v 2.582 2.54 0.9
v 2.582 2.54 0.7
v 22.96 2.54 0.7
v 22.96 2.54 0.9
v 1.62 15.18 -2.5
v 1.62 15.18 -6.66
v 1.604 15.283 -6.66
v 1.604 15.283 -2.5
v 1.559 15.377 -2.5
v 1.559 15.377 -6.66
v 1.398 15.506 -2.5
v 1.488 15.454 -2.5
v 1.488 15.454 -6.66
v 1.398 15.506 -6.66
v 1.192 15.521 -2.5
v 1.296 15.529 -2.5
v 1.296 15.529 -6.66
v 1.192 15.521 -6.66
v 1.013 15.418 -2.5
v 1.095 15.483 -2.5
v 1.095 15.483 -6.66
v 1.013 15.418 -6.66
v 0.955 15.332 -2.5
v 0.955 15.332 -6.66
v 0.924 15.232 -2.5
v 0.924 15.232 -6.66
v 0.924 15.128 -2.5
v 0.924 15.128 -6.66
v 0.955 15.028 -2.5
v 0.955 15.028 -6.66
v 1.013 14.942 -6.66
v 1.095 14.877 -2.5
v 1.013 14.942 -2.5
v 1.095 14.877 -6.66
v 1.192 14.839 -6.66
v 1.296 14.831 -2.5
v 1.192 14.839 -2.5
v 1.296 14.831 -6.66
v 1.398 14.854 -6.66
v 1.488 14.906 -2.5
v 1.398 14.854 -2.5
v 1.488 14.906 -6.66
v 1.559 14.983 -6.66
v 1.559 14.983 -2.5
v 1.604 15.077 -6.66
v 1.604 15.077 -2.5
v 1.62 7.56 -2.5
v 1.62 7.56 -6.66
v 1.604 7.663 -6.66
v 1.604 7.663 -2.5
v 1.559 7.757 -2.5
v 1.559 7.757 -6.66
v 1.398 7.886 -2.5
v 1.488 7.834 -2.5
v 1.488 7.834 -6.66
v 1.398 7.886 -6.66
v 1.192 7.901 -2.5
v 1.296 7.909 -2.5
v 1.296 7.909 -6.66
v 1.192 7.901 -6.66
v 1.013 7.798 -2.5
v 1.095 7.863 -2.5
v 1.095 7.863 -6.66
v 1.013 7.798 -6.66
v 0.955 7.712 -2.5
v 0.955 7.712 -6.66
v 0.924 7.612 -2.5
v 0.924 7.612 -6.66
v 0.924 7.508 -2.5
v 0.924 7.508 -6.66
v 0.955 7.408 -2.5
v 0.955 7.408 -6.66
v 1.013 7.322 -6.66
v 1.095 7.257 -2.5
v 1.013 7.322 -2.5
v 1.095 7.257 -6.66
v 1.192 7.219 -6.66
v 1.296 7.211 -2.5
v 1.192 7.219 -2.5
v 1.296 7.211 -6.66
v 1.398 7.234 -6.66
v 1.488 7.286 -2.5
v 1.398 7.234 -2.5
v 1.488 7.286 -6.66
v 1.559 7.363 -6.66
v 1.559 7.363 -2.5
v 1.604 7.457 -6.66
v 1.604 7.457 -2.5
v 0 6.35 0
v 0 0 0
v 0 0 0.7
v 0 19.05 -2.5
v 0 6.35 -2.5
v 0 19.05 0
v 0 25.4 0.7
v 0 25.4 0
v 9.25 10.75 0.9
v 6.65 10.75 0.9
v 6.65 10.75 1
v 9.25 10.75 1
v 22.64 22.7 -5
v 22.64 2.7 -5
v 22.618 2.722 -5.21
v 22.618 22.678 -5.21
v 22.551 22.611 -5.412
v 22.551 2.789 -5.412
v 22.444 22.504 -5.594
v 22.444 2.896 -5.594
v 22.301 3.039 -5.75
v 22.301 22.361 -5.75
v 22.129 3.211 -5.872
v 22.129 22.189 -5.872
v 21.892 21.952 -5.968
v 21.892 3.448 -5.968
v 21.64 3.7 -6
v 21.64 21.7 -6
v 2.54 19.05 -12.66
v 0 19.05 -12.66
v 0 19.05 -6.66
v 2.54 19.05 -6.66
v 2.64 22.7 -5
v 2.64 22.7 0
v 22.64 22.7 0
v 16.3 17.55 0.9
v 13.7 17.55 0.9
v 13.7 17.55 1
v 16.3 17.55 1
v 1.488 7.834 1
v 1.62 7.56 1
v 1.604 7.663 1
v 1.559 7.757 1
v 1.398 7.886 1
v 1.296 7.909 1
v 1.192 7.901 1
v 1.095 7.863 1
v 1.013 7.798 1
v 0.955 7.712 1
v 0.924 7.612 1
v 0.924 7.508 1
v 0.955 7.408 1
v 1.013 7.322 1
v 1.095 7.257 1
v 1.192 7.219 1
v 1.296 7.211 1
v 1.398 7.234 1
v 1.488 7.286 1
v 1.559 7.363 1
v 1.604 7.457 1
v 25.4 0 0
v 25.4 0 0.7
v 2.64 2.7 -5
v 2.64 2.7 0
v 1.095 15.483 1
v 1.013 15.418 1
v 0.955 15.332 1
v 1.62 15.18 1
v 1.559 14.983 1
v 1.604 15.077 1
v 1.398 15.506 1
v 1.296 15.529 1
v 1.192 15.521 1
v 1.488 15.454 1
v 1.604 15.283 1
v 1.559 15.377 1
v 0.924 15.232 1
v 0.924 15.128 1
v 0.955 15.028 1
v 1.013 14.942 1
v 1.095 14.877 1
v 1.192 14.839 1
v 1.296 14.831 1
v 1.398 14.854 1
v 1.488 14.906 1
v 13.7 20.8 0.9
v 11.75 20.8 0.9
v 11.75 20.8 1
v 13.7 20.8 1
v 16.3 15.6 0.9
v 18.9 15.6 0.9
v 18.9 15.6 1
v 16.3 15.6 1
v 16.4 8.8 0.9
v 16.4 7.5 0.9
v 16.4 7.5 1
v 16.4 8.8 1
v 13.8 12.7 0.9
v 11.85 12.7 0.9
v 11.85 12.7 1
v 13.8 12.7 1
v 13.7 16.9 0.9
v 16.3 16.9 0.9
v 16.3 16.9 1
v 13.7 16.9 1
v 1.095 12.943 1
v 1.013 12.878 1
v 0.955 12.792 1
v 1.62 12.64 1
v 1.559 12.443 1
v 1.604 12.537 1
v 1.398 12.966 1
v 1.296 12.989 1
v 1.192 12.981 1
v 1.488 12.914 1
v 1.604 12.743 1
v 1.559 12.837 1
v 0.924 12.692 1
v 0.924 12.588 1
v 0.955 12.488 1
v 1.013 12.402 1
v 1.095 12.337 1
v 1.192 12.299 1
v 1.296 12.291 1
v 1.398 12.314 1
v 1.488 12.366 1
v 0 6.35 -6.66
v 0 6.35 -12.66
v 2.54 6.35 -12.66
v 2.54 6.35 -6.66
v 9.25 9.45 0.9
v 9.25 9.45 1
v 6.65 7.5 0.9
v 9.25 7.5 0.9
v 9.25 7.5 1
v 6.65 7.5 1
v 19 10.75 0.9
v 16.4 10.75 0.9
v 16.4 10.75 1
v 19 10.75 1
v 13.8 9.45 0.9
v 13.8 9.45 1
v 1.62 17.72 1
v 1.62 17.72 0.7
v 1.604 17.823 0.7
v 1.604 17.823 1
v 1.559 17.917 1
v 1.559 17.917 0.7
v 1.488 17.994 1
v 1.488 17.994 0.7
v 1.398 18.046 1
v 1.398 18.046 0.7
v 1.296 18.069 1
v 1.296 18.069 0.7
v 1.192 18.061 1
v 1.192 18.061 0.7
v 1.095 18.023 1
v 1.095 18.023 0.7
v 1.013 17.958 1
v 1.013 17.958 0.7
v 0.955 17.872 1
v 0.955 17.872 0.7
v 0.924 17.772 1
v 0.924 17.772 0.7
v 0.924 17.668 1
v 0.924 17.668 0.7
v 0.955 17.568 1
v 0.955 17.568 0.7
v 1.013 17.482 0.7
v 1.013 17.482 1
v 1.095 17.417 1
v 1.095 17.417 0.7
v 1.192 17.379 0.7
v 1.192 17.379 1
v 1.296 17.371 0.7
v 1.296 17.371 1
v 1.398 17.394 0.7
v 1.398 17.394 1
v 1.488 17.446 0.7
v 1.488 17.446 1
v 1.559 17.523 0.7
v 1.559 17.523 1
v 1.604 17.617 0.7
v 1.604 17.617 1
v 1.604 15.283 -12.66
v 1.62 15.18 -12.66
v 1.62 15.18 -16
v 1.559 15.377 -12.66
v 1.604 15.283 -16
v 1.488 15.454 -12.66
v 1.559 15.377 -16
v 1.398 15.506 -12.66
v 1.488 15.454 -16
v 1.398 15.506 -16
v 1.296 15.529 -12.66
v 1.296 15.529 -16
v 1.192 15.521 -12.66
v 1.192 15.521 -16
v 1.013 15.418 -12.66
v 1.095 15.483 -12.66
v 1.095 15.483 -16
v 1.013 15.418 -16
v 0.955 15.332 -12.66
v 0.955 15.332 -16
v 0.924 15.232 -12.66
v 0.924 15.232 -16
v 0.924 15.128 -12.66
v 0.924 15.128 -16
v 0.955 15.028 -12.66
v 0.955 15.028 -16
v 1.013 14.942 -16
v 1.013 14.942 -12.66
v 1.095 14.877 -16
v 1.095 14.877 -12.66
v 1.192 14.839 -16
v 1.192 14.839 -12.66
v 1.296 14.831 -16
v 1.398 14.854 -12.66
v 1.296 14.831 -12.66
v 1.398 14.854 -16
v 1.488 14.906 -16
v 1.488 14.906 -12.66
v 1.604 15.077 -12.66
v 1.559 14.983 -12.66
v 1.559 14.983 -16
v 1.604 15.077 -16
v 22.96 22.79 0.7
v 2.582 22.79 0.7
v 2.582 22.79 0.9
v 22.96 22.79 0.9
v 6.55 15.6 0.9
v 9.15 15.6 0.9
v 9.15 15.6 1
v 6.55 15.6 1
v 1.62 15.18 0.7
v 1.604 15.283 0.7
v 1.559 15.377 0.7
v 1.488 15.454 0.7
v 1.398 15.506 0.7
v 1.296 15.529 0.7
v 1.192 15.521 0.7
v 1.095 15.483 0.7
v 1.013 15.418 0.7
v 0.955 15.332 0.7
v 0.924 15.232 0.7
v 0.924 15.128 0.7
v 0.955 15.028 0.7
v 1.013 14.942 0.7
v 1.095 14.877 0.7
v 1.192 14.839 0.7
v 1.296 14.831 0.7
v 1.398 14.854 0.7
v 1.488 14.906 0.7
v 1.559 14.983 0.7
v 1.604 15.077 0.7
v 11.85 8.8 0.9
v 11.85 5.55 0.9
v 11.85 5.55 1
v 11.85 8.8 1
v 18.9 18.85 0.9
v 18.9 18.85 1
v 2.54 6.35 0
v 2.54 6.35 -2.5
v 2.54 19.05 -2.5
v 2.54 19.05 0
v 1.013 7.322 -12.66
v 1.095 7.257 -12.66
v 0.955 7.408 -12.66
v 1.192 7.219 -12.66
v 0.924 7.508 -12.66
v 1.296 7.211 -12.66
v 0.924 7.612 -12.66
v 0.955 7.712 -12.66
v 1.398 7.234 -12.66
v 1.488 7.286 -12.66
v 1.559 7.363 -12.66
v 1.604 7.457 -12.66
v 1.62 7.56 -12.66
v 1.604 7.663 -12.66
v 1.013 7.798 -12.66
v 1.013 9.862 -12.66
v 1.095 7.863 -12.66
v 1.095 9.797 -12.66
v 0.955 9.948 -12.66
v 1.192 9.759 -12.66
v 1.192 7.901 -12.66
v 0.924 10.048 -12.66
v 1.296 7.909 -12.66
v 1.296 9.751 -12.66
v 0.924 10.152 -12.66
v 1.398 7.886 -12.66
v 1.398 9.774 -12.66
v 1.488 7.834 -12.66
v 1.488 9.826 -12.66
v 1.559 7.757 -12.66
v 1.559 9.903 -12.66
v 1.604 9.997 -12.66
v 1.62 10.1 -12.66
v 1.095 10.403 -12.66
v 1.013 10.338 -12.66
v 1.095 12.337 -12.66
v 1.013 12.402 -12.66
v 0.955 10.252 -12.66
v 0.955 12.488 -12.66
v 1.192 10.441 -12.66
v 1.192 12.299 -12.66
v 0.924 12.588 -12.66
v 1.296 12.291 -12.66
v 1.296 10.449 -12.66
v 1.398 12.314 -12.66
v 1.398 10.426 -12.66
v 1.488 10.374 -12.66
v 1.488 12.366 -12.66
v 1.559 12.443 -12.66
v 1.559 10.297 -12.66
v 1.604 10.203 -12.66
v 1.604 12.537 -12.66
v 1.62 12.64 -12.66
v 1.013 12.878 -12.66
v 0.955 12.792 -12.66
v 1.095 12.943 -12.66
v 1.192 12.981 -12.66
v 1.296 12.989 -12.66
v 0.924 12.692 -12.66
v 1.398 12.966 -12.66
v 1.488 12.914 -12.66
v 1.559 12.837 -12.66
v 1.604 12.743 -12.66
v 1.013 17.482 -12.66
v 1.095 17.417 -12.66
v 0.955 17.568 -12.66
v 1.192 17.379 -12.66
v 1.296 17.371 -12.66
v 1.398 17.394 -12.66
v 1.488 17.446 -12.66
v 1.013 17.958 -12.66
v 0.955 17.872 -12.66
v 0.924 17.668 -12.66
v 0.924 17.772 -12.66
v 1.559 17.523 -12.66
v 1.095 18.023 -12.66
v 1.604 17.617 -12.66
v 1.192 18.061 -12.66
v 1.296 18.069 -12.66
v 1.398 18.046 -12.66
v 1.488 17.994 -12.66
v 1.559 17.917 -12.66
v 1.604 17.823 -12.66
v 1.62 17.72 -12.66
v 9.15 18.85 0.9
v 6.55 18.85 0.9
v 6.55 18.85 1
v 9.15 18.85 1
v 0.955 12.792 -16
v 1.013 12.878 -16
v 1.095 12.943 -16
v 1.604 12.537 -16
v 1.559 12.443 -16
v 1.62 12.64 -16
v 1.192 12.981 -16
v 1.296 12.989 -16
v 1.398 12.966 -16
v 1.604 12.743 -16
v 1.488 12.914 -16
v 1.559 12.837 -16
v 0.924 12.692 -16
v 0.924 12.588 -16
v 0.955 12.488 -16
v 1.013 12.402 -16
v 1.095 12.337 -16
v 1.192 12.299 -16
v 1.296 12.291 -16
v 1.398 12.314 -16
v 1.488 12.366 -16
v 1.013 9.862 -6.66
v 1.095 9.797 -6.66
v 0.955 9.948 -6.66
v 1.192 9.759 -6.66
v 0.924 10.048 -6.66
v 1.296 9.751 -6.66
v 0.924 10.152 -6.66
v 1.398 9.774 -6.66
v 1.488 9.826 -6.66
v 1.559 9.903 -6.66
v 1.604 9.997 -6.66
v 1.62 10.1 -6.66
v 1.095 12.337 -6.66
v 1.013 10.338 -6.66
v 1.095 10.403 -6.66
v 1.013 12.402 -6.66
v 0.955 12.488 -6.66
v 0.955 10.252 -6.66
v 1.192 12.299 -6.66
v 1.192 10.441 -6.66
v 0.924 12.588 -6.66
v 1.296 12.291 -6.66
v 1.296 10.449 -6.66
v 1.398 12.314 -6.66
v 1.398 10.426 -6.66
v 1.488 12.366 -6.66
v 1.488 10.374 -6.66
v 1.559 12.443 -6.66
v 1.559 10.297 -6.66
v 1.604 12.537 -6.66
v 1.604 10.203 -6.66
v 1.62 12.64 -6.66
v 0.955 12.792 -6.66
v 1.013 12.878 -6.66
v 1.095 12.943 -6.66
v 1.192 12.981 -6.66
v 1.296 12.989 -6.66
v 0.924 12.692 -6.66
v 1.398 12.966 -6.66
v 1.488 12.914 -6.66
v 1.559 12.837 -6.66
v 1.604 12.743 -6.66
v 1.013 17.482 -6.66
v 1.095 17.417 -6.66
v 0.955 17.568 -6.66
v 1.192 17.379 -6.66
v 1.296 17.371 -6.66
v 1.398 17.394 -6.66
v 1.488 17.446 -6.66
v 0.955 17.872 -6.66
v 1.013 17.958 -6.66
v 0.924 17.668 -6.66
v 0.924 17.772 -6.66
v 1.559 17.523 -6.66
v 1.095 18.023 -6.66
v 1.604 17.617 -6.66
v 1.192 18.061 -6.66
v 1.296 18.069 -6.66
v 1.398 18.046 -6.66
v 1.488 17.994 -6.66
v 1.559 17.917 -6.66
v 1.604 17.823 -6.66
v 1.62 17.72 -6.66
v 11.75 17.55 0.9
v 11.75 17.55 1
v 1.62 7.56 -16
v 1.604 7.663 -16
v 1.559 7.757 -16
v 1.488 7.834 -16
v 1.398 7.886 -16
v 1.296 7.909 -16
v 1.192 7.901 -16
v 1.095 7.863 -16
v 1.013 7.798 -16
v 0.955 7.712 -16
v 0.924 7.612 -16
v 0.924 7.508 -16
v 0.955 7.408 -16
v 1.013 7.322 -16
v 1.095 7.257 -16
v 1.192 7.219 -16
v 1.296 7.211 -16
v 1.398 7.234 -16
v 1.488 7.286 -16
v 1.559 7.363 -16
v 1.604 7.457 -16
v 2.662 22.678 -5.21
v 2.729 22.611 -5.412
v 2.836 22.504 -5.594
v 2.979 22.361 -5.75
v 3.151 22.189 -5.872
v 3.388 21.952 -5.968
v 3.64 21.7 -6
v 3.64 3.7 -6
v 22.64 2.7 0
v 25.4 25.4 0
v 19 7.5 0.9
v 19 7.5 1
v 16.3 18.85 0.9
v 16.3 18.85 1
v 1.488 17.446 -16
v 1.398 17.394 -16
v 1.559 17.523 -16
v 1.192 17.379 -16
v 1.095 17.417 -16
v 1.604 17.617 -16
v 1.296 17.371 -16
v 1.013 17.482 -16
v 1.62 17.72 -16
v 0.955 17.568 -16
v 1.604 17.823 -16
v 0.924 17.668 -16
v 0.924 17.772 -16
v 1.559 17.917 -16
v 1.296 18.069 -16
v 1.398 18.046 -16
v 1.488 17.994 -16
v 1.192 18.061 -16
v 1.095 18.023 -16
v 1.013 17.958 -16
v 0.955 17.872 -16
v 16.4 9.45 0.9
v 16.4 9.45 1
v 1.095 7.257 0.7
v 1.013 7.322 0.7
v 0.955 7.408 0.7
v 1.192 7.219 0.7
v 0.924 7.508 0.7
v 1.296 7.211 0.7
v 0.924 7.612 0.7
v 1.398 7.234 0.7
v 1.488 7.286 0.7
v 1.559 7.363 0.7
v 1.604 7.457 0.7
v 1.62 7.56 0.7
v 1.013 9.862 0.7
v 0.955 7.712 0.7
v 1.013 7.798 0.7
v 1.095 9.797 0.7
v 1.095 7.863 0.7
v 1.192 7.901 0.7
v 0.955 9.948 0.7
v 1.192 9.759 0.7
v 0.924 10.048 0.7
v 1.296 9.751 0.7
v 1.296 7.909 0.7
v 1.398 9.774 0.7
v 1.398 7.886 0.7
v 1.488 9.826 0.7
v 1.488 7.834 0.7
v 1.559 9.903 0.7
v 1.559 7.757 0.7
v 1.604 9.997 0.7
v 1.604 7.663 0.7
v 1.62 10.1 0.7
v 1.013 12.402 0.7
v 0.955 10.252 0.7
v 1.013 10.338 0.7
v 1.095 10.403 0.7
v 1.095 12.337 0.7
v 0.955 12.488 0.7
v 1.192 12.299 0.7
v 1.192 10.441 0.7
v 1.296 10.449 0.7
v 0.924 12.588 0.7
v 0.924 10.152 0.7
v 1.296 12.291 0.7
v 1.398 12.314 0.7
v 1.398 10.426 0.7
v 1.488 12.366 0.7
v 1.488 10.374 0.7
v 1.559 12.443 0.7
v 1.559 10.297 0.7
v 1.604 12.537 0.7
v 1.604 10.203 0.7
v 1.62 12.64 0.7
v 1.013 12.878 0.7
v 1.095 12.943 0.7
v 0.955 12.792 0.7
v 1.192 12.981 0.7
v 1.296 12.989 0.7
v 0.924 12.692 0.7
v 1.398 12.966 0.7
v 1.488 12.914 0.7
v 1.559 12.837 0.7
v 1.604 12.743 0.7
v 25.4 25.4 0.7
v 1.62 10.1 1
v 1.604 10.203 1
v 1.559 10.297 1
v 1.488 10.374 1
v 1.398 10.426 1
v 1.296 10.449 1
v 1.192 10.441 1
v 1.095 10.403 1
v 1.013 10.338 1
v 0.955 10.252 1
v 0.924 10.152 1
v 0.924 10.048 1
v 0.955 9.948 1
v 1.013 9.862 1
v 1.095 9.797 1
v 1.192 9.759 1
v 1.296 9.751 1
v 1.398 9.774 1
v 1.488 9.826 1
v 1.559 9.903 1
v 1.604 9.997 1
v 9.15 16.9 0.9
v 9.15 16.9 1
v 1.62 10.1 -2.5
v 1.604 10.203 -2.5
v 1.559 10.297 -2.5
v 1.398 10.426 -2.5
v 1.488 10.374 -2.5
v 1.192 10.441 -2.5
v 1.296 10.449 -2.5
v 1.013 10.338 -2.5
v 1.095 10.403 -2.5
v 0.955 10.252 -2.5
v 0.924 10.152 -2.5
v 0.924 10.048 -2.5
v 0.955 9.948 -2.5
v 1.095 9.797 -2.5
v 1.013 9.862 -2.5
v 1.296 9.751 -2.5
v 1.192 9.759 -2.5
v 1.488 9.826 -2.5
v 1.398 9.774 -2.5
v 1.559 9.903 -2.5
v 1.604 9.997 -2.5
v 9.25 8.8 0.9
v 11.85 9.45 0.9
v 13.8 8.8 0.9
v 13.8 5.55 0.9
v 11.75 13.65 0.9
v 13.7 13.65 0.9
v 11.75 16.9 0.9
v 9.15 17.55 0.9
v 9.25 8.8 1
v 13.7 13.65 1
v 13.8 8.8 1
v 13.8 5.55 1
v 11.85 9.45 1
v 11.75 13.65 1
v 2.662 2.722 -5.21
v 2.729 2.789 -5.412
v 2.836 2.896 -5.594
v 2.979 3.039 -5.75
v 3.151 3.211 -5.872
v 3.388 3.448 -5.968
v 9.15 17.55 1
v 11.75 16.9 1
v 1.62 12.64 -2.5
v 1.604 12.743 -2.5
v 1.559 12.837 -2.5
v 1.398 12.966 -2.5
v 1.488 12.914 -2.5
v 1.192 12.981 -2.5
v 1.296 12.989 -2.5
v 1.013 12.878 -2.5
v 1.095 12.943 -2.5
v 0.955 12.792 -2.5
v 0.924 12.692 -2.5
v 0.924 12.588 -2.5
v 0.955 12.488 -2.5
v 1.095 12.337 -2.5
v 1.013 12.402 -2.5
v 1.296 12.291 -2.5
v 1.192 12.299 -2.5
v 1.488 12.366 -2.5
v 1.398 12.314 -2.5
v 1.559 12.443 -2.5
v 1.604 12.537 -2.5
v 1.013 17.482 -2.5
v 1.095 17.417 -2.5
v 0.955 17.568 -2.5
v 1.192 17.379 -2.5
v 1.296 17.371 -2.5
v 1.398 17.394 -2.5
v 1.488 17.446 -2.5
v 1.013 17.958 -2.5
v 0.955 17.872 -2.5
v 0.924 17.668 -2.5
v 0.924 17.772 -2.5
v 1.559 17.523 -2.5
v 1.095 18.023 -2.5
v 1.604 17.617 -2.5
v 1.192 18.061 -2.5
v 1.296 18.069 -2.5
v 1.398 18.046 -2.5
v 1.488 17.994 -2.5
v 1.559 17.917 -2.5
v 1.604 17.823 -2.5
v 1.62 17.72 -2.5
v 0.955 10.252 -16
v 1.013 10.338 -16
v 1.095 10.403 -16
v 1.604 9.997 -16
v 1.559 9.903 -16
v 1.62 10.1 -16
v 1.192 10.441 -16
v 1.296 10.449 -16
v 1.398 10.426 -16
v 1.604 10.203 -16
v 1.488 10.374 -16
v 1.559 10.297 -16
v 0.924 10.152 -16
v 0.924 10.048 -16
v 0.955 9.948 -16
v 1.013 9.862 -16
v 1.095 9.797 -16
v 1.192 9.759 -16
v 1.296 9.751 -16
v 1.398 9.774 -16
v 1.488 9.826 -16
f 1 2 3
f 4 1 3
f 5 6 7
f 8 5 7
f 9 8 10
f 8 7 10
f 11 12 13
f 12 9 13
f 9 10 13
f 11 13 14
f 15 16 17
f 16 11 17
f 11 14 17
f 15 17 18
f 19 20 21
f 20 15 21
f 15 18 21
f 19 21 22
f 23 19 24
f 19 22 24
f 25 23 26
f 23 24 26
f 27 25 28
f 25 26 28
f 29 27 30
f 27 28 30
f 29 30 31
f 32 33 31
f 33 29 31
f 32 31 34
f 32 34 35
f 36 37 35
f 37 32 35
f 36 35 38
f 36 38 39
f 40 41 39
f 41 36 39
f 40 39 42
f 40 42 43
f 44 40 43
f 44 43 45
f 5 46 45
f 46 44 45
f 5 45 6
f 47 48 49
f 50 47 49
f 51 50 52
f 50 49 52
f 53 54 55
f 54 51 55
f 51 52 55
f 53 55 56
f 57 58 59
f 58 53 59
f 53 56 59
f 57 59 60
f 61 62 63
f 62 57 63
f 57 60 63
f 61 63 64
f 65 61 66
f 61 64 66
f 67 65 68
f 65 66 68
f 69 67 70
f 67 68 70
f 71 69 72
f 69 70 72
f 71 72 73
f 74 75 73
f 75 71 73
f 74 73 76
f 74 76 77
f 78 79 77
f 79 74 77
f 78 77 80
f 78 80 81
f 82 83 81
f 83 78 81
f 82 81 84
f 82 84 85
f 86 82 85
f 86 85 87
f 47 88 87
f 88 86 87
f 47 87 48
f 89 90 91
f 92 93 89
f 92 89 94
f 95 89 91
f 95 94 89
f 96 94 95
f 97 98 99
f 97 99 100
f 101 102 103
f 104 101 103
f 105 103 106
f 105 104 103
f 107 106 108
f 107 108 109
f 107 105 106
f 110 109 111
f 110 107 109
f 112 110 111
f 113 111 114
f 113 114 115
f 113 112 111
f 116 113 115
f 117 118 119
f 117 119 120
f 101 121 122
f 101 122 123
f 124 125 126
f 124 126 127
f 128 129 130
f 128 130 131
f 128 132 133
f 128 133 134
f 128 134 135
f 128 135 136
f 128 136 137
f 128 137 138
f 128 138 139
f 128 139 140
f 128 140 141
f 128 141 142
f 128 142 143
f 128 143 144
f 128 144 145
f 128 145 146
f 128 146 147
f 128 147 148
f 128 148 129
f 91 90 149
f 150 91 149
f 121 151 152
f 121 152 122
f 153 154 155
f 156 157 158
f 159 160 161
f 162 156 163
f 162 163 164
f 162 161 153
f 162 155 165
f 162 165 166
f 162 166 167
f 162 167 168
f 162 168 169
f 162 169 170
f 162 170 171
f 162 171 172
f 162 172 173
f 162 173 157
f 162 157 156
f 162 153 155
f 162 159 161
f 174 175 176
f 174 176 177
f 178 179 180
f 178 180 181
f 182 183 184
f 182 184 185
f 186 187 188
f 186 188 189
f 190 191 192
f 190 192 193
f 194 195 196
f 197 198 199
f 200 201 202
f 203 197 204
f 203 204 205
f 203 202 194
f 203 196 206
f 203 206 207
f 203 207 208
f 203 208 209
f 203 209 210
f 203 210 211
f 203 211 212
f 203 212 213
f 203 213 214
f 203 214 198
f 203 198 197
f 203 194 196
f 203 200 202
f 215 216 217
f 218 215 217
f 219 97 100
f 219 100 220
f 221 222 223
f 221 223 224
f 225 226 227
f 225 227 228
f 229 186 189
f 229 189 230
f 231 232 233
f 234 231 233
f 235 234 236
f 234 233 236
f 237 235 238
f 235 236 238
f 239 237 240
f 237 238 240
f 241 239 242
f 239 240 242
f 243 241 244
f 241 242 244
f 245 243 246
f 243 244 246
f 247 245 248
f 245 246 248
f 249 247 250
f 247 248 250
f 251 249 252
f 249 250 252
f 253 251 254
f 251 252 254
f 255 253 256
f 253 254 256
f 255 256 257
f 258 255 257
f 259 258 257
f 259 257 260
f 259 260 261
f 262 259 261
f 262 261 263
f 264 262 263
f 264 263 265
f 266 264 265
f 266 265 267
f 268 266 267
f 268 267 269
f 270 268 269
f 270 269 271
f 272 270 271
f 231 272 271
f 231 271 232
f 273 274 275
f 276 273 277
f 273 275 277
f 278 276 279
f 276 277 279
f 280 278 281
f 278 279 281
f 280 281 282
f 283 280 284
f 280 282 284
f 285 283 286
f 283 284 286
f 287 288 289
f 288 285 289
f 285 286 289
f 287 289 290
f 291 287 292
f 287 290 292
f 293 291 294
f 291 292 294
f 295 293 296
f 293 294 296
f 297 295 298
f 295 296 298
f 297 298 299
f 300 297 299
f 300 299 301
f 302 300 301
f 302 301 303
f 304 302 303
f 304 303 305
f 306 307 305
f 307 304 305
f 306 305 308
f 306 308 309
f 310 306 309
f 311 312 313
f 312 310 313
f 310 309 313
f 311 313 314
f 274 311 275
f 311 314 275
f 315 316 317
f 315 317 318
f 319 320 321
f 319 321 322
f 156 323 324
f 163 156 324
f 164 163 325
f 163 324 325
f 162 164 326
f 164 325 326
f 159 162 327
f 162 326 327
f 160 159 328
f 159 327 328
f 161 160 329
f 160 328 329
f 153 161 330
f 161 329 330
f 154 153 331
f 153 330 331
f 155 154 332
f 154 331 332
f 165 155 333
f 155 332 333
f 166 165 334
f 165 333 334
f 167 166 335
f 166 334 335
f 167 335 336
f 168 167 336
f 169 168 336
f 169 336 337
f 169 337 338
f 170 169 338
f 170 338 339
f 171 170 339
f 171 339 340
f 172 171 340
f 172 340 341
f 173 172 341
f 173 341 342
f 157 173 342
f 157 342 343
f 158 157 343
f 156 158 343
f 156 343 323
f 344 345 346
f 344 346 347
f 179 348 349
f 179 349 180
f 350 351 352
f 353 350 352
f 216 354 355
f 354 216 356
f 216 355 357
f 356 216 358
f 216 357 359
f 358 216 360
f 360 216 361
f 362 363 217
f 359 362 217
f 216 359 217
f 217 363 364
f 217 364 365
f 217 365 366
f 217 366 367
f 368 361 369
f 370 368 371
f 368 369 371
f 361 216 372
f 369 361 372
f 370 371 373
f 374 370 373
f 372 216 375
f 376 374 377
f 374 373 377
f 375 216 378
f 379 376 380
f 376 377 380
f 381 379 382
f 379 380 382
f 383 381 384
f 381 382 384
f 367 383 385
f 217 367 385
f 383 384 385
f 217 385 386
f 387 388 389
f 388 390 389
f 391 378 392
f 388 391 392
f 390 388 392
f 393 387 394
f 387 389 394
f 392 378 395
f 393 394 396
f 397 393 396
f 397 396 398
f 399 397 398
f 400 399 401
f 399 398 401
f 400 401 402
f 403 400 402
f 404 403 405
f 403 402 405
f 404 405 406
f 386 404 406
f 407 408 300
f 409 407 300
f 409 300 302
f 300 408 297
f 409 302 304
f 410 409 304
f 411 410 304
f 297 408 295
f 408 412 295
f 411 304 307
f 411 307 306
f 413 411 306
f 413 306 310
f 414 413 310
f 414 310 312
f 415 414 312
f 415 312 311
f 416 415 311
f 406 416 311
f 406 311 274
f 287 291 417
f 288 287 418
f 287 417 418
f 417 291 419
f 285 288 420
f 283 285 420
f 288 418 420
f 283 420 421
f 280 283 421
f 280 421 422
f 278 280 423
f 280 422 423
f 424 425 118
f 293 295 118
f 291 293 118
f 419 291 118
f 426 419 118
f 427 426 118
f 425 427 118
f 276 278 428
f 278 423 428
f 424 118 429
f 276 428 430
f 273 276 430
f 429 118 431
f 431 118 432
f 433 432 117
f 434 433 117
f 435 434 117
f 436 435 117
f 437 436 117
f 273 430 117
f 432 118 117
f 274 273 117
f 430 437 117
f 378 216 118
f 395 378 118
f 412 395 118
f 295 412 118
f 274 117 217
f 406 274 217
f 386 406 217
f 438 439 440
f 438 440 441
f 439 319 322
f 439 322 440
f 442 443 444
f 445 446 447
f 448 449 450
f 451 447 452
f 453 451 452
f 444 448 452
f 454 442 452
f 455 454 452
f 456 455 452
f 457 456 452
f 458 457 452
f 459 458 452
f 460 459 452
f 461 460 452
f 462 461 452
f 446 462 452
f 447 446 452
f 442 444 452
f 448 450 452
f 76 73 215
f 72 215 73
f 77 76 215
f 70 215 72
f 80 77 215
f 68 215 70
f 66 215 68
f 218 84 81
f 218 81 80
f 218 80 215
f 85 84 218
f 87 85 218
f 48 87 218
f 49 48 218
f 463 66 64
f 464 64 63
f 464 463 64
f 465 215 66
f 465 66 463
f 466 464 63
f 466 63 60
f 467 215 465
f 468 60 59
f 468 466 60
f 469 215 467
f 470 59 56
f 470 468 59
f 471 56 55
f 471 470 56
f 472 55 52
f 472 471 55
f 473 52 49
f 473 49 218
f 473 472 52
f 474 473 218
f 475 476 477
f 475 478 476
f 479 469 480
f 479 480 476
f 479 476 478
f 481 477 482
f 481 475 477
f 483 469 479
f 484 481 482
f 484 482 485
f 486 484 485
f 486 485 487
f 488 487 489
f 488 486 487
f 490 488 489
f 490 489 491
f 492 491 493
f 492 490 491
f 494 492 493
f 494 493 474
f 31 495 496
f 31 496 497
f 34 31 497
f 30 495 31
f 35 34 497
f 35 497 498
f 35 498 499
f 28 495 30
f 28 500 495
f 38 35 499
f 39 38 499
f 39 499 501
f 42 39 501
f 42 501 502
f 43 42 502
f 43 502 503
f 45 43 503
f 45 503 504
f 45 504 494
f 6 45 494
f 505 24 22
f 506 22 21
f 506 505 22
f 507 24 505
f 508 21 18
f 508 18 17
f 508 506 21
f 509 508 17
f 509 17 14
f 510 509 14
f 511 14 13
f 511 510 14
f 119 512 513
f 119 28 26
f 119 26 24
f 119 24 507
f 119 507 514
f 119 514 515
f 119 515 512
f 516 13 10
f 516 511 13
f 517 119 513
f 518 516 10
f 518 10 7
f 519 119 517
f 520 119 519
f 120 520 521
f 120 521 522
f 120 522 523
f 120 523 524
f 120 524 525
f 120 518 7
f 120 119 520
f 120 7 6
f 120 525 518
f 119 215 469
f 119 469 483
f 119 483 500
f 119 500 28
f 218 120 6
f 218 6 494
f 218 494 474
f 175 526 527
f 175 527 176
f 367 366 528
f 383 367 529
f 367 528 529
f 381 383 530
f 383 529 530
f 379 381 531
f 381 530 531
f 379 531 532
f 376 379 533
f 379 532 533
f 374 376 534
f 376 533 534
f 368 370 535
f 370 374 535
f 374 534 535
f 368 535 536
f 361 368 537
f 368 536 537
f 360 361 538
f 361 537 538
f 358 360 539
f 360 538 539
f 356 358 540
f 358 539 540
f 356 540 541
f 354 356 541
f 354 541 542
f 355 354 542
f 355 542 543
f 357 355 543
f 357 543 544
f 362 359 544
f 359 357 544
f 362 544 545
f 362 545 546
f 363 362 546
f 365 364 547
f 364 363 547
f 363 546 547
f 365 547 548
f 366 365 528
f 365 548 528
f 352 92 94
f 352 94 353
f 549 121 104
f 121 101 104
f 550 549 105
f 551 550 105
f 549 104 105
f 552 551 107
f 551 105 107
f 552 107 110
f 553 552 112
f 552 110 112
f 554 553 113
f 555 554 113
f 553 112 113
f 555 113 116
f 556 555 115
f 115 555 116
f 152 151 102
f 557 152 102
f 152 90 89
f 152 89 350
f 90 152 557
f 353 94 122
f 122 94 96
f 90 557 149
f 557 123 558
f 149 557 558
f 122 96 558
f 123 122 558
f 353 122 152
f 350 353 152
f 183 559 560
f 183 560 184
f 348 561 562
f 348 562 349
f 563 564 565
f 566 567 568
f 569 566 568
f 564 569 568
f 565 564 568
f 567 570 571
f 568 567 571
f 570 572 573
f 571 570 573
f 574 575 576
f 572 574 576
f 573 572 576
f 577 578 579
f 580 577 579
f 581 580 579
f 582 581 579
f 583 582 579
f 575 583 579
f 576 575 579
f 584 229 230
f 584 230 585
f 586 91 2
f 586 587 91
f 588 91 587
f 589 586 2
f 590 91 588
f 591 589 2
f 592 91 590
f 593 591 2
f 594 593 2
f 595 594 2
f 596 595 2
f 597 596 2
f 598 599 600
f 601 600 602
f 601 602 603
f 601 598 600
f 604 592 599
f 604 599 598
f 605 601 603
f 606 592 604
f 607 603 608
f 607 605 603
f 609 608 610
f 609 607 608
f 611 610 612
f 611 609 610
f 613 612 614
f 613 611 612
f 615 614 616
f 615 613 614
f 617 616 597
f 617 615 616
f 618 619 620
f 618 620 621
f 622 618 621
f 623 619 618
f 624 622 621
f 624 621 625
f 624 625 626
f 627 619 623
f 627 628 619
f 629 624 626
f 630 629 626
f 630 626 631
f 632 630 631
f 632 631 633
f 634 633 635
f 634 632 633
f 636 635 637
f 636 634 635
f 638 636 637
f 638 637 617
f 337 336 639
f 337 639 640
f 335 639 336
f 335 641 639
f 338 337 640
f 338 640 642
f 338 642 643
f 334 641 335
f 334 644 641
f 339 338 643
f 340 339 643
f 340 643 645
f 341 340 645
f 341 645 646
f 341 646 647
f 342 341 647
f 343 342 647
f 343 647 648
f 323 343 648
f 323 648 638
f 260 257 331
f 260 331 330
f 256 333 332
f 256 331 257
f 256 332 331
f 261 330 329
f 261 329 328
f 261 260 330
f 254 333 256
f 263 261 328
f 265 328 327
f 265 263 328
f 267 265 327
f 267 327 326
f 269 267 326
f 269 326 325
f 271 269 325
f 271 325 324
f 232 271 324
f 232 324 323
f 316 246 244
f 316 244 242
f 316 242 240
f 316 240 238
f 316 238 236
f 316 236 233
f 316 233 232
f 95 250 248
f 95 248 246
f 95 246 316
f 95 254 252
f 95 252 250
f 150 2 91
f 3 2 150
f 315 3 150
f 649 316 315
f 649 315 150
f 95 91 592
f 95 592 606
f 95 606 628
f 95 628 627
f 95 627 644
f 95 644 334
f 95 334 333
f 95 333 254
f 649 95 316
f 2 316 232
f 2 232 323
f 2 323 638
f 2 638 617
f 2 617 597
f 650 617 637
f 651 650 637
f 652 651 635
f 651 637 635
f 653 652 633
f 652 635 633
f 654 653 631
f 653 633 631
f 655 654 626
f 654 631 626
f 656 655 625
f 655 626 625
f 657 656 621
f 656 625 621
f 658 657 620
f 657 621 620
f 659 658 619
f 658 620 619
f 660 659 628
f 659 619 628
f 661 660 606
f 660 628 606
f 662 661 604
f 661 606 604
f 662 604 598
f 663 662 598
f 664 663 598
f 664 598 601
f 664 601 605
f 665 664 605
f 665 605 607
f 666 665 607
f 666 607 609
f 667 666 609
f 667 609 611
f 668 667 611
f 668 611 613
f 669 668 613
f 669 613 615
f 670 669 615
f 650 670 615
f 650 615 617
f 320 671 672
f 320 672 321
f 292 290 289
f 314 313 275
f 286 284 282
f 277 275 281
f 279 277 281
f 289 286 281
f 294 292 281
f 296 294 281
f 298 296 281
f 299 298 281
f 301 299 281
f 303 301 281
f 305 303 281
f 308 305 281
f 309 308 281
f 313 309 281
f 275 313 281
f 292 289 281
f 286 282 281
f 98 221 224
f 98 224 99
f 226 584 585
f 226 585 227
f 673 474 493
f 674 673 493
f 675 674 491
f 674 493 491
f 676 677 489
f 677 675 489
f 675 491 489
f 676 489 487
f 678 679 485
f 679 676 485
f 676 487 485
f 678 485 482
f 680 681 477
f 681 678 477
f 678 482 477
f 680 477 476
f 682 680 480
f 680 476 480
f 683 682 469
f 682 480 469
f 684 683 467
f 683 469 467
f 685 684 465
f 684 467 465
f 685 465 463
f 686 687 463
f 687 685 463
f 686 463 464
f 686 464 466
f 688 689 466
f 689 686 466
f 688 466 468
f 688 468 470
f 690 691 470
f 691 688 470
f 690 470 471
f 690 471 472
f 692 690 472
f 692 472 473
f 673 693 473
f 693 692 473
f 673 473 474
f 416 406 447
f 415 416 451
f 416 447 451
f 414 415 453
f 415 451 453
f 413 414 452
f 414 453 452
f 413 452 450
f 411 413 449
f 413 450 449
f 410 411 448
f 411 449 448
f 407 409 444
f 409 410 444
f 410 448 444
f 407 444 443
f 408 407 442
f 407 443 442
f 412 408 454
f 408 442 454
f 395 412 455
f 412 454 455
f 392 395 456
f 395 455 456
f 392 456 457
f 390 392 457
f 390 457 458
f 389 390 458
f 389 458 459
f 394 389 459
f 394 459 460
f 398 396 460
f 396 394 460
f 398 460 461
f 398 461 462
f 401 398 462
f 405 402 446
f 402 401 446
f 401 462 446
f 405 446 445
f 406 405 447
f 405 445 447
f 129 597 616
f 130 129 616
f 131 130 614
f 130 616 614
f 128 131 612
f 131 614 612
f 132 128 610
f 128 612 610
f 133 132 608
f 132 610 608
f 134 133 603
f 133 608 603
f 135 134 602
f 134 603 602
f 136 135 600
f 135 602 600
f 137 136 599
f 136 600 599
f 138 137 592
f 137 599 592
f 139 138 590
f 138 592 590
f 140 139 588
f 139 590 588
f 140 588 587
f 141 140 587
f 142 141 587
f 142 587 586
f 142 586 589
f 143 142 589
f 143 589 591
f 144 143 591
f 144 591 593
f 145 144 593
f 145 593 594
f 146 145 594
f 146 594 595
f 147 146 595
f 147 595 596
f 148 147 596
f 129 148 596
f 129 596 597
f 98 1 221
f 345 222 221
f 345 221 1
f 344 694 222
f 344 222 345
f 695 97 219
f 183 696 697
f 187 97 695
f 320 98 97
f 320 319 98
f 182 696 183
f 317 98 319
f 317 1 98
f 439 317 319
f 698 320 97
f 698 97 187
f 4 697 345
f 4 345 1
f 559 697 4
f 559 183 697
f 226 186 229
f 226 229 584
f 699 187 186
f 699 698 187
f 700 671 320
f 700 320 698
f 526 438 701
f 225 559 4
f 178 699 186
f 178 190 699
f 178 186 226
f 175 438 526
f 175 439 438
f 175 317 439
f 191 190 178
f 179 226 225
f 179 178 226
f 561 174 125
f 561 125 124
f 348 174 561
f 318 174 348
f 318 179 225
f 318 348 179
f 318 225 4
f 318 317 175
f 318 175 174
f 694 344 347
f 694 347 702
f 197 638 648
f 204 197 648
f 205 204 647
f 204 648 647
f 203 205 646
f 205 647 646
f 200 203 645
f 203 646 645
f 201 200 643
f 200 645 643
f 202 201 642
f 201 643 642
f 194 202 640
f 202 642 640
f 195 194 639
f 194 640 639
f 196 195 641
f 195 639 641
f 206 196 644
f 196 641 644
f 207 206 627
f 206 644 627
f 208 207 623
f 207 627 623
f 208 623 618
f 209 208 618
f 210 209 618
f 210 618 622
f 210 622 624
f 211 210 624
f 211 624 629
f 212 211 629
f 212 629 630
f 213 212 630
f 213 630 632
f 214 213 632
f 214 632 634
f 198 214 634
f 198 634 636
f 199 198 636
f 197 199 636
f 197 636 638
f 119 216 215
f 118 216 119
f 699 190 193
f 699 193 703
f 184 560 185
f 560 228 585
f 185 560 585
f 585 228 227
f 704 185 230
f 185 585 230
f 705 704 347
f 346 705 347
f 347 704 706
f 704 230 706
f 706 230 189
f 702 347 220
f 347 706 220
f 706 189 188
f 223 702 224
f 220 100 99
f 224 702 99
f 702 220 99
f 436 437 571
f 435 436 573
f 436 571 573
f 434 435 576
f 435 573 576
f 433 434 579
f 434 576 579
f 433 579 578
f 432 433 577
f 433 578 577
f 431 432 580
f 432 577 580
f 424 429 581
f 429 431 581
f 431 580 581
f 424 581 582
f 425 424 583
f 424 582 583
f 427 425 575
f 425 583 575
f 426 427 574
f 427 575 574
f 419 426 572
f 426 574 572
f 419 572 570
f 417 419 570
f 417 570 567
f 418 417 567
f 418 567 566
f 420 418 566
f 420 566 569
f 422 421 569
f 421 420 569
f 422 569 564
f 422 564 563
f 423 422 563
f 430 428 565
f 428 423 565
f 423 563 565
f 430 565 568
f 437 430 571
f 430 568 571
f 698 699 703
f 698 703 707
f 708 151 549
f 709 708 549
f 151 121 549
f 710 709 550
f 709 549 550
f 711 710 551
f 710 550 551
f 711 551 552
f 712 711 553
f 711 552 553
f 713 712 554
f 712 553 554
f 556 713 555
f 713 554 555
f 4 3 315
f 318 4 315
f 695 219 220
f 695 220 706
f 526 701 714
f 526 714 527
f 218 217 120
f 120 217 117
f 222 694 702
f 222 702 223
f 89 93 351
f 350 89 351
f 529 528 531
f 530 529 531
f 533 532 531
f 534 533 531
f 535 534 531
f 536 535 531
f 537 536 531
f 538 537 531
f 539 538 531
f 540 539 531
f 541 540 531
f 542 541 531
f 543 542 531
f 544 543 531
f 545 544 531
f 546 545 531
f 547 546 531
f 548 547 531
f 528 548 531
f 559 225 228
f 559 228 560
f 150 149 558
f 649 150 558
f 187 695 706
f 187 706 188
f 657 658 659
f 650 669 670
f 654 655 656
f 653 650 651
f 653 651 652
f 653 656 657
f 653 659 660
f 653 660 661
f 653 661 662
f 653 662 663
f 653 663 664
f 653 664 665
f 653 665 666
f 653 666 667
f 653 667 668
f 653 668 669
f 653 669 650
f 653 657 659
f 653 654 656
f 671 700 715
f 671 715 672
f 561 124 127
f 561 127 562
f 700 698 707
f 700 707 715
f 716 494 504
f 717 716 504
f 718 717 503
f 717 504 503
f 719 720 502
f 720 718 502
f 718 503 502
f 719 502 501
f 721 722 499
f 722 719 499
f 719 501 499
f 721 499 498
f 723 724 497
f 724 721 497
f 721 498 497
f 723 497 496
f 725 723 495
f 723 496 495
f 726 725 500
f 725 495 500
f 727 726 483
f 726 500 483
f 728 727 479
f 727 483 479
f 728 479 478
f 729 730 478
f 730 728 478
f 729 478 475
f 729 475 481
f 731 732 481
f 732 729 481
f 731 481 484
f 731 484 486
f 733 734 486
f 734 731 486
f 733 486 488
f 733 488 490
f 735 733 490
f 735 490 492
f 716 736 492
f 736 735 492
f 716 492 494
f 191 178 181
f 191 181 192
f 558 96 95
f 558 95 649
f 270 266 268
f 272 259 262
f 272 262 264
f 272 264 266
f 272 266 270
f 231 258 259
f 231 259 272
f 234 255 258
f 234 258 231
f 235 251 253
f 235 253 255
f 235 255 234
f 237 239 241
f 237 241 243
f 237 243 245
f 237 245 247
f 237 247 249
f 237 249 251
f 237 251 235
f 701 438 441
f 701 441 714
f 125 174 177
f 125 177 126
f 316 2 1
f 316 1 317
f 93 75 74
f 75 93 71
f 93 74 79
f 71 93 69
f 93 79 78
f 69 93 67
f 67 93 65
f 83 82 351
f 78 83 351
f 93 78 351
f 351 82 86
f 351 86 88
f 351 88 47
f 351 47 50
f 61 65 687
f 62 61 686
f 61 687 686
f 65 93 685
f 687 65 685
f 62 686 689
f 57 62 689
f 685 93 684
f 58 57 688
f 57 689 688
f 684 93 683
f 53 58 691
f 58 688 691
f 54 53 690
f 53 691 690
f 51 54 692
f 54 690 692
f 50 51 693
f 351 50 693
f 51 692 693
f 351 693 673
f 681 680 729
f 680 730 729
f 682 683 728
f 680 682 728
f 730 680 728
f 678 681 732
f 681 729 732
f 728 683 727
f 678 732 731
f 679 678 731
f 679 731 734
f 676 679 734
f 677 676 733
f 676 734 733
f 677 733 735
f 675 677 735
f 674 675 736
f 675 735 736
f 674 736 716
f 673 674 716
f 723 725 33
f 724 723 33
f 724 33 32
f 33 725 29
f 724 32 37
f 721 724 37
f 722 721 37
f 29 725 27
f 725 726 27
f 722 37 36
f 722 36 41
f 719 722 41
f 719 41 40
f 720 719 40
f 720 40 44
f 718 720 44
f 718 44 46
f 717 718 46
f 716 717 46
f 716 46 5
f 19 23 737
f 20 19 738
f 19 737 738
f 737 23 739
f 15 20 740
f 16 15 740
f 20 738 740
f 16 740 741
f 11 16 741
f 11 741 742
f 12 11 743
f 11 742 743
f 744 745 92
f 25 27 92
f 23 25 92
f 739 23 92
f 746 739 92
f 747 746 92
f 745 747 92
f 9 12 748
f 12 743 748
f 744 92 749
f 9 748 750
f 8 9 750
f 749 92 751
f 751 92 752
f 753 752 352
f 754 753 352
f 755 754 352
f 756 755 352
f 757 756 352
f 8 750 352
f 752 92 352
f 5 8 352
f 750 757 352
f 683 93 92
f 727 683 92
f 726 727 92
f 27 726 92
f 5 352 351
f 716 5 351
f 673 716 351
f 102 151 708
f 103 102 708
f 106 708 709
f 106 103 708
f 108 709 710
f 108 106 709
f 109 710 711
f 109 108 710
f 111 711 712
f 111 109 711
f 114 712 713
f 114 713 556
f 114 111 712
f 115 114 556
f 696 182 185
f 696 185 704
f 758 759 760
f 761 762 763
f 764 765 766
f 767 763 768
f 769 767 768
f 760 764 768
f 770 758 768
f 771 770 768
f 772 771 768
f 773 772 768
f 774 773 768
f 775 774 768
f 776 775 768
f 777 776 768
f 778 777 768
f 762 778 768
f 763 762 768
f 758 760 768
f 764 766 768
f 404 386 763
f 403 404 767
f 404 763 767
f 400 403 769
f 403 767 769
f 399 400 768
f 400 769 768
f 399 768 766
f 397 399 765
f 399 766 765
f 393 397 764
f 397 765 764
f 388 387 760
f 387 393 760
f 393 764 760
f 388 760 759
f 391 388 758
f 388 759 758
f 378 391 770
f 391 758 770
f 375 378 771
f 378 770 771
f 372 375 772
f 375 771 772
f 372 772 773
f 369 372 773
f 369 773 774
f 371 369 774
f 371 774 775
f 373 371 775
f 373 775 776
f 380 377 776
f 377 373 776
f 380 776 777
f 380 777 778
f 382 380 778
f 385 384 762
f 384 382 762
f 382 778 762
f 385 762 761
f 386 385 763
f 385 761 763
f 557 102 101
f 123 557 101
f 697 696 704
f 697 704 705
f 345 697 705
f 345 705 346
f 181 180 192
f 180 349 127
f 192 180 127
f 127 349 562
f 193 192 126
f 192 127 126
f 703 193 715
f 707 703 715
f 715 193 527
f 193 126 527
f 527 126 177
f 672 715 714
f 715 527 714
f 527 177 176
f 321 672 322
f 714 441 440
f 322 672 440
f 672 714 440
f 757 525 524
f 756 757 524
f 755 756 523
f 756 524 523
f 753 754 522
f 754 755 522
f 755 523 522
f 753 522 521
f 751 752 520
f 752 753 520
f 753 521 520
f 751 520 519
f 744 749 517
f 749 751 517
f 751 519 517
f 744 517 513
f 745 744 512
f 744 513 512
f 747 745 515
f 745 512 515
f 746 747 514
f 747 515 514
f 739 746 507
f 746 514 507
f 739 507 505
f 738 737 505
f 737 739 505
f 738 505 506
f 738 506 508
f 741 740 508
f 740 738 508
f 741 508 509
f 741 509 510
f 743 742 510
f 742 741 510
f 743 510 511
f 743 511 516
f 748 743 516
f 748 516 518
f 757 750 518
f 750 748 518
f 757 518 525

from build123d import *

# Parameters (mm, degrees)
BOX002_W          = 2.54
BOX002_H          = 12.7
BOX002_DEPTH      = 2.54
CYLINDER_R        = 0.35
CYLINDER_DEPTH    = 17
CYLINDER001_R     = 0.35
CYLINDER001_DEPTH = 17
CYLINDER002_R     = 0.35
CYLINDER002_DEPTH = 17
CYLINDER003_R     = 0.35
CYLINDER003_DEPTH = 17
CYLINDER004_R     = 0.35
CYLINDER004_DEPTH = 17
BOX001_W          = 20
BOX001_H          = 20
BOX001_DEPTH      = 6
FILLET_R          = 1
BOX003_W          = 2.54
BOX003_H          = 12.7
BOX003_DEPTH      = 6
PAD_DEPTH         = 1
SKETCH002_W       = 20.378432
SKETCH002_H       = 20.250089
PAD001_DEPTH      = 0.5
PAD002_DEPTH      = 1
BOX_W             = 25.4
BOX_H             = 25.4
BOX_DEPTH         = 0.7


with BuildPart() as w_rfel002:
    # Box002 → Box002 (new body)
    with BuildSketch(Plane(origin=(0, 6.35, -2.5), x_dir=(1, 0, 0), z_dir=(0, 0, 1))):
        with Locations((1.27, 6.35)):
            Rectangle(BOX002_W, BOX002_H)
    extrude(amount=BOX002_DEPTH)


with BuildPart() as zylinder:
    # Cylinder → Cylinder (new body)
    with BuildSketch(Plane(origin=(1.27, 10.1, -16), x_dir=(1, 0, 0), z_dir=(0, 0, 1))):
        Circle(CYLINDER_R)
    extrude(amount=CYLINDER_DEPTH)


with BuildPart() as zylinder001:
    # Cylinder001 → Cylinder001 (new body)
    with BuildSketch(Plane(origin=(1.27, 12.64, -16), x_dir=(1, 0, 0), z_dir=(0, 0, 1))):
        Circle(CYLINDER001_R)
    extrude(amount=CYLINDER001_DEPTH)


with BuildPart() as zylinder002:
    # Cylinder002 → Cylinder002 (new body)
    with BuildSketch(Plane(origin=(1.27, 7.56, -16), x_dir=(1, 0, 0), z_dir=(0, 0, 1))):
        Circle(CYLINDER002_R)
    extrude(amount=CYLINDER002_DEPTH)


with BuildPart() as zylinder003:
    # Cylinder003 → Cylinder003 (new body)
    with BuildSketch(Plane(origin=(1.27, 15.18, -16), x_dir=(1, 0, 0), z_dir=(0, 0, 1))):
        Circle(CYLINDER003_R)
    extrude(amount=CYLINDER003_DEPTH)


with BuildPart() as zylinder004:
    # Cylinder004 → Cylinder004 (new body)
    with BuildSketch(Plane(origin=(1.27, 17.72, -16), x_dir=(1, 0, 0), z_dir=(0, 0, 1))):
        Circle(CYLINDER004_R)
    extrude(amount=CYLINDER004_DEPTH)


with BuildPart() as fillet_body:
    # Box001 → Box001 (new body)
    with BuildSketch(Plane(origin=(2.64, 2.7, -6), x_dir=(1, 0, 0), z_dir=(0, 0, 1))):
        with Locations((10, 10)):
            Rectangle(BOX001_W, BOX001_H)
    extrude(amount=BOX001_DEPTH)

    # Fillet
    fillet_edges = [fillet_body.edges().sort_by_distance(p)[0] for p in [
        (2.64, 12.7, -6),
        (22.64, 12.7, -6),
        (12.64, 2.7, -6),
        (12.64, 22.7, -6),
    ]]
    fillet(fillet_edges, radius=FILLET_R)


with BuildPart() as w_rfel003:
    # Box003 → Box003 (new body)
    with BuildSketch(Plane(origin=(0, 6.35, -12.66), x_dir=(1, 0, 0), z_dir=(0, 0, 1))):
        with Locations((1.27, 6.35)):
            Rectangle(BOX003_W, BOX003_H)
    extrude(amount=BOX003_DEPTH)


with BuildPart() as body:
    # Sketch001 → Pad (new body)
    with BuildSketch(Plane.XY):
        Polygon((-18.85, 18.85), (-16.25, 18.85), (-16.25, 17.55), (-13.65, 17.55), (-13.65, 20.8), (-11.7, 20.8), (-11.7, 17.55), (-9.1, 17.55), (-9.1, 18.85), (-6.5, 18.85), (-6.5, 15.6), (-9.1, 15.6), (-9.1, 16.9), (-11.7, 16.9), (-11.7, 13.65), (-13.65, 13.65), (-13.65, 16.9), (-16.25, 16.9), (-16.25, 15.6), (-18.85, 15.6), align=None)
    extrude(amount=PAD_DEPTH)


with BuildPart() as body_1:
    # Body placement: moved
    add(body.part.moved(Location((25.4, 0, 0))))


with BuildPart() as body001:
    # Sketch002 → Pad001 (new body)
    with BuildSketch(Plane.XY):
        with Locations((-12.729216, 12.665044)):
            Rectangle(SKETCH002_W, SKETCH002_H)
    extrude(amount=PAD001_DEPTH)


with BuildPart() as body001_1:
    # Body001 placement: moved
    add(body001.part.moved(Location((25.5, 0, 0.4))))


with BuildPart() as body002:
    # Sketch003 → Pad002 (new body)
    with BuildSketch(Plane.XY):
        Polygon((-18.85, 18.85), (-16.25, 18.85), (-16.25, 17.55), (-13.65, 17.55), (-13.65, 20.8), (-11.7, 20.8), (-11.7, 17.55), (-9.1, 17.55), (-9.1, 18.85), (-6.5, 18.85), (-6.5, 15.6), (-9.1, 15.6), (-9.1, 16.9), (-11.7, 16.9), (-11.7, 13.65), (-13.65, 13.65), (-13.65, 16.9), (-16.25, 16.9), (-16.25, 15.6), (-18.85, 15.6), align=None)
    extrude(amount=PAD002_DEPTH)


with BuildPart() as body002_1:
    # Body002 placement: moved
    add(body002.part.moved(Location((25.5, -8.1, 0))))


with BuildPart() as fusion:
    # Box → Box (new body)
    with BuildSketch(Plane.XY):
        with Locations((12.7, 12.7)):
            Rectangle(BOX_W, BOX_H)
    extrude(amount=BOX_DEPTH)

    # Fusion: union Würfel002, Zylinder, Zylinder001, Zylinder002, Zylinder003, Zylinder004, Fillet body, Würfel003, Body, Body001, Body002
    add(w_rfel002.part)
    add(zylinder.part)
    add(zylinder001.part)
    add(zylinder002.part)
    add(zylinder003.part)
    add(zylinder004.part)
    add(fillet_body.part)
    add(w_rfel003.part)
    add(body_1.part)
    add(body001_1.part)
    add(body002_1.part)


solid = fusion.part
